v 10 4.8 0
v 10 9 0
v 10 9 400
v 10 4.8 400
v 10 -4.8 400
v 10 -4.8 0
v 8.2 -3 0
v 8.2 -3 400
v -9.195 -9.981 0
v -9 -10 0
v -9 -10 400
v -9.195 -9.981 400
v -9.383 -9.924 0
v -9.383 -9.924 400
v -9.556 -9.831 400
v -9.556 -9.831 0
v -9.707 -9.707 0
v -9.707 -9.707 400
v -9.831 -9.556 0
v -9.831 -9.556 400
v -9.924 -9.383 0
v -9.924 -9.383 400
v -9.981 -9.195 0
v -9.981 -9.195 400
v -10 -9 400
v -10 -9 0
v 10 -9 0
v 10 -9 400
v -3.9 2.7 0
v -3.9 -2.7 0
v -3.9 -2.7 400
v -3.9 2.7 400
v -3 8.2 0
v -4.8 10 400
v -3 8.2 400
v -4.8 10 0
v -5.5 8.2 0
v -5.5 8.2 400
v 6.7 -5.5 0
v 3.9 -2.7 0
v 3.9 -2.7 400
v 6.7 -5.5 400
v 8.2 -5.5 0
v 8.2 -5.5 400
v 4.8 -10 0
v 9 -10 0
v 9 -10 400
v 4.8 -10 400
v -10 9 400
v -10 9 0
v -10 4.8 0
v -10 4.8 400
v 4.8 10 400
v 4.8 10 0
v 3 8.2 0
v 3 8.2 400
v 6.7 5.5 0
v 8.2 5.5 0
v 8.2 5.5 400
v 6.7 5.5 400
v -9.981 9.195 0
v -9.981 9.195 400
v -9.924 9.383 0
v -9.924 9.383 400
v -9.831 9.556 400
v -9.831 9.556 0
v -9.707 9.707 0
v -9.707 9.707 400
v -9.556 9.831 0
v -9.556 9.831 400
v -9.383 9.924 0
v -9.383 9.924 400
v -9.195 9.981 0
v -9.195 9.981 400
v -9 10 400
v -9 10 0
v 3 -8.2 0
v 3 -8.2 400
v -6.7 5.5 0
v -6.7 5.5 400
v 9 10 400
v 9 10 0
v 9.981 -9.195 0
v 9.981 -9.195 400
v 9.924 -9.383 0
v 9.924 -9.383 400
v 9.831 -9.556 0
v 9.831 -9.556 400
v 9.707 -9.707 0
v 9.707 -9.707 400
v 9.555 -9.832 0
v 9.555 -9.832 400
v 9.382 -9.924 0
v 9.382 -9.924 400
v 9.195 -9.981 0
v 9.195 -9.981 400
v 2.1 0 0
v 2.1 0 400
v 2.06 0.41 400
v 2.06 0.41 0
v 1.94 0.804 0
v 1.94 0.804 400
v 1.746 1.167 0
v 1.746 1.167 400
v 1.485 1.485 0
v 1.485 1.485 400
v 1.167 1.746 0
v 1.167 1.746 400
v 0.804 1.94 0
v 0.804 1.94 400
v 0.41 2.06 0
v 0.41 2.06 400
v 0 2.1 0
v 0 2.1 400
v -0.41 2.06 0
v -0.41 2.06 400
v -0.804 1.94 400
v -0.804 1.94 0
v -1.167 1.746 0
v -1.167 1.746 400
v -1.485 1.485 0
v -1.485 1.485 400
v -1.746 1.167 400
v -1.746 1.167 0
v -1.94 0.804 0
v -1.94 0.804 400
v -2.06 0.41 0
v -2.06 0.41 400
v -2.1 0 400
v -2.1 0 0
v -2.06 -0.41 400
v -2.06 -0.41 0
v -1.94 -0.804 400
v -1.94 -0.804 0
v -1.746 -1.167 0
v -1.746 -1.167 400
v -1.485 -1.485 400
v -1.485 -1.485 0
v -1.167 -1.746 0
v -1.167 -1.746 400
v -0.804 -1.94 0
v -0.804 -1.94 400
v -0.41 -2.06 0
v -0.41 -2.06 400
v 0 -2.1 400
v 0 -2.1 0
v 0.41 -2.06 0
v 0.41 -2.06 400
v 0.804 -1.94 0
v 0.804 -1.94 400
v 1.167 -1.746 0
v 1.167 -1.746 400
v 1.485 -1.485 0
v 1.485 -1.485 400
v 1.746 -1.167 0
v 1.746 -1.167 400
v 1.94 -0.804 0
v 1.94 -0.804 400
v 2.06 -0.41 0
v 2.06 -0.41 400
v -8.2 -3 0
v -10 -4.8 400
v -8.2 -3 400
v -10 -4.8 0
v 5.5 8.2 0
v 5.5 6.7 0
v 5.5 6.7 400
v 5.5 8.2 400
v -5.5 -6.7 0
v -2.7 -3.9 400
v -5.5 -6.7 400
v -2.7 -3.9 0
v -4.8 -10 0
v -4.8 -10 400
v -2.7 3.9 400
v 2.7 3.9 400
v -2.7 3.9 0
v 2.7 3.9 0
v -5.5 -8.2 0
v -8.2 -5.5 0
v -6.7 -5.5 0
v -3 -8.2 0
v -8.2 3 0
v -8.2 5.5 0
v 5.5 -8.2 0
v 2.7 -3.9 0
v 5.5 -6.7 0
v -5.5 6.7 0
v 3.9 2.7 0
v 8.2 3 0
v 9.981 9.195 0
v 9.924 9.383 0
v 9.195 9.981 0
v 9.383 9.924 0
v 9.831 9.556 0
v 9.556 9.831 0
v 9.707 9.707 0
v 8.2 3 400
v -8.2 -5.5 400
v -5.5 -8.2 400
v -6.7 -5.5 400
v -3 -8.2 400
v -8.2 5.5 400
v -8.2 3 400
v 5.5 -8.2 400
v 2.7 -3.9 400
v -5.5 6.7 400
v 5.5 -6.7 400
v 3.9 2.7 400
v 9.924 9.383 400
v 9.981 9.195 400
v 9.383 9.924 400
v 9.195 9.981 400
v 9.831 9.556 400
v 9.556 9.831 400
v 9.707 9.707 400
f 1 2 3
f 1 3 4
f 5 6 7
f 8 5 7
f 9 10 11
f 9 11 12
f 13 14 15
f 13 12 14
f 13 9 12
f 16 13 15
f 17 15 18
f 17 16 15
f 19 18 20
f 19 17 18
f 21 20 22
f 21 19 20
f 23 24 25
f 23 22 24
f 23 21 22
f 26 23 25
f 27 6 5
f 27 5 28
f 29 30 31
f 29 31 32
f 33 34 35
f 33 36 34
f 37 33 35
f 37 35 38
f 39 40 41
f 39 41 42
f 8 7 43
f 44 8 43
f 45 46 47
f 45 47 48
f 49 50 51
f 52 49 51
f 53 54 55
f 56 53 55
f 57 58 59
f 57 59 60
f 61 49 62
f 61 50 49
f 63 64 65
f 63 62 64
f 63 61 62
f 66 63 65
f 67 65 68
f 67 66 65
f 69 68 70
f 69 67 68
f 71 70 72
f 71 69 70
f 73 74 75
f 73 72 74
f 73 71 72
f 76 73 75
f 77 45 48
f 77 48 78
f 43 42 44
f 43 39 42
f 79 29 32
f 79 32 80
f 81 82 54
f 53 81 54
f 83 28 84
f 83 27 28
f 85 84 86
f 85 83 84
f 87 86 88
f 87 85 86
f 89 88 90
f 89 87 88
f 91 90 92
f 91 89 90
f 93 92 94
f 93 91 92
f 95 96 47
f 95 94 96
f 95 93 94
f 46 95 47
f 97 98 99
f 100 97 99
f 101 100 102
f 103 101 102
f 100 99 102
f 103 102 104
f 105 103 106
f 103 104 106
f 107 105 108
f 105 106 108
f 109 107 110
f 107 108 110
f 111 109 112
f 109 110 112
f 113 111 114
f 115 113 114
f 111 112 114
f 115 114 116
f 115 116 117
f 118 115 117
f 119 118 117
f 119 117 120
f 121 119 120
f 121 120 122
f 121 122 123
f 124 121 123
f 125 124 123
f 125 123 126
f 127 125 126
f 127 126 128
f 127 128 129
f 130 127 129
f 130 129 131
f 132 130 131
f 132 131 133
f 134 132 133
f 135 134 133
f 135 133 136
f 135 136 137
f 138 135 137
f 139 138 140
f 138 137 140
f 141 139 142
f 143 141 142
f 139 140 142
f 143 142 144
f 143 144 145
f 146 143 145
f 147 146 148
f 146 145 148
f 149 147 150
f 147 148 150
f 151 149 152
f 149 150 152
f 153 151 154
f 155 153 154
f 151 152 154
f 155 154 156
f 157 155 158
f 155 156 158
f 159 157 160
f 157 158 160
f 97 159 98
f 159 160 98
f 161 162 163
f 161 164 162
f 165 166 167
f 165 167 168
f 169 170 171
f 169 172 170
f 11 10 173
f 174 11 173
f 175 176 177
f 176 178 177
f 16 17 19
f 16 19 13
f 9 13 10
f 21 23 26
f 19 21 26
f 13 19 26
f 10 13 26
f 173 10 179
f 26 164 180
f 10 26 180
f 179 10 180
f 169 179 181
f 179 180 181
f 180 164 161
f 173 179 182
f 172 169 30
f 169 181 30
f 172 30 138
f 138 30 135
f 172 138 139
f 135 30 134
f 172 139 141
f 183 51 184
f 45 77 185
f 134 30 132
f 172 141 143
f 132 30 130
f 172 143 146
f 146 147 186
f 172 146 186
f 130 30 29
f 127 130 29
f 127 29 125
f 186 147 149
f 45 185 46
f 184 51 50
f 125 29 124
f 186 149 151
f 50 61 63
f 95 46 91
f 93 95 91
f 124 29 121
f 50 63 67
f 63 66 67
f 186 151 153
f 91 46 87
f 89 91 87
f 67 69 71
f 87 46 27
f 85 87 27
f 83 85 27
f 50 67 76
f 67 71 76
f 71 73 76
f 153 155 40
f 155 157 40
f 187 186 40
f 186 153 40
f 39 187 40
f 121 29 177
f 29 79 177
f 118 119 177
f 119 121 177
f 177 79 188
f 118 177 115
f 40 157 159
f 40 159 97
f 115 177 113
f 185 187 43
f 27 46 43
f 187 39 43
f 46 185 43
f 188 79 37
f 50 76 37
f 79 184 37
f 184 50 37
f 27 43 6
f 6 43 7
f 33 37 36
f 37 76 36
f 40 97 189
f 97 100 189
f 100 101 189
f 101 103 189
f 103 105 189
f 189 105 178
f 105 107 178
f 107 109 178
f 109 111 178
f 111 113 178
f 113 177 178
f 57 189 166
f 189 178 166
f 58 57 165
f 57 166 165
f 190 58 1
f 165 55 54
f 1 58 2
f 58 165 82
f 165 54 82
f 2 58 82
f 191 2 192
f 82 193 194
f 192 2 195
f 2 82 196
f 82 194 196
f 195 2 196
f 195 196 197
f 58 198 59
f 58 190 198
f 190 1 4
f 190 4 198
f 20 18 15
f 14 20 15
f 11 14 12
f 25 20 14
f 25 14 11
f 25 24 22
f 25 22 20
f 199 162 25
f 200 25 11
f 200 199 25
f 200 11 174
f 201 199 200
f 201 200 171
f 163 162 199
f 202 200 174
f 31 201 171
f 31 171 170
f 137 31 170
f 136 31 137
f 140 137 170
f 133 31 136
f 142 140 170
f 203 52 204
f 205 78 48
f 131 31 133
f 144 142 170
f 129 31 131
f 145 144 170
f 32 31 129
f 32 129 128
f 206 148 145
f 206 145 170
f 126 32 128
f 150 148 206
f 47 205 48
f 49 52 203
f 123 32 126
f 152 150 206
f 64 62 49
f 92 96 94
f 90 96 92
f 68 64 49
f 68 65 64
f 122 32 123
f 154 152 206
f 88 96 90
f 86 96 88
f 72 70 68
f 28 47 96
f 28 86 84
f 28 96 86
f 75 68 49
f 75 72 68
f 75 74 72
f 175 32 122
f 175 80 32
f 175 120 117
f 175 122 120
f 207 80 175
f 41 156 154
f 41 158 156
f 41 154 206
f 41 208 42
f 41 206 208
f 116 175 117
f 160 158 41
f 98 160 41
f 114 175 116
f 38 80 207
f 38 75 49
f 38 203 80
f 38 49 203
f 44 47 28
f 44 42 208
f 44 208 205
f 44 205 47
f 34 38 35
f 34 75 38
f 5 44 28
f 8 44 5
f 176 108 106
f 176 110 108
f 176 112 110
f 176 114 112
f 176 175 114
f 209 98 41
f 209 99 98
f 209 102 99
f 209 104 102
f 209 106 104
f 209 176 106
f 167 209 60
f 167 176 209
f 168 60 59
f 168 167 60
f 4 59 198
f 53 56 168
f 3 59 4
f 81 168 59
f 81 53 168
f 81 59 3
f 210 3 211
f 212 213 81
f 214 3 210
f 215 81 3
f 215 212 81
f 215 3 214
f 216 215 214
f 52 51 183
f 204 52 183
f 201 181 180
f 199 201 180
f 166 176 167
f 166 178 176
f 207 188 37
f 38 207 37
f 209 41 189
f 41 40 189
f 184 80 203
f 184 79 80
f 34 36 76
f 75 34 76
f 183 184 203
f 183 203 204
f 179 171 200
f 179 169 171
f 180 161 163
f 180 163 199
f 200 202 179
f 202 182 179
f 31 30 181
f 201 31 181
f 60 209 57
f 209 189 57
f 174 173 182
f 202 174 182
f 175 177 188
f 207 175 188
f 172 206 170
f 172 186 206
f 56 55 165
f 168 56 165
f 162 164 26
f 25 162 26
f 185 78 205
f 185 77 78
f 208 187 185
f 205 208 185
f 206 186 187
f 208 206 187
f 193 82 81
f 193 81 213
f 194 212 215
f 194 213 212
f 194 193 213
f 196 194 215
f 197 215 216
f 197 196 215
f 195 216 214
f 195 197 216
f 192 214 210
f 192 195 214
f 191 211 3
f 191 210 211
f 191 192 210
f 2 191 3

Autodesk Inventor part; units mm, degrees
ref_plane "YZ Plane" through (0, 0, 0) normal (1, 0, 0) x (0, 1, 0)
ref_plane "XZ Plane" through (0, 0, 0) normal (0, 1, 0) x (-1, 0, 0)
ref_plane "XY Plane" through (0, 0, 0) normal (0, 0, 1) x (1, 0, 0)
sketch "Эскиз1" plane through (0, 0, 0) normal (0, 0, 1) x (1, 0, 0)
  line L0 (-4.8, 10) -> (-3, 8.2)
  line L1 (-4.8, 10) -> (-2.2544, 10) construction
  line L2 (4.8, 10) -> (3, 8.2)
  line L3 (4.8, 10) -> (7.3456, 10) construction
  line L4 (10, 4.8) -> (8.2, 3)
  arc A0 (-9, 10) -> (-10, 9) centre (-9, 9) ccw
  arc A1 (10, 9) -> (9, 10) centre (9, 9) ccw
  arc A2 (-10, -9) -> (-9, -10) centre (-9, -9) ccw
  arc A3 (8.9996, -10) -> (10, -9) centre (9, -9) ccw
  line L5 (0, 3.9) -> (-2.7, 3.9)
  line L6 (0, 3.9) -> (2.7, 3.9)
  line L7 (3, 8.2) -> (5.5, 8.2)
  line L8 (2.7, 3.9) -> (5.5, 6.7)
  line L9 (5.5, 6.7) -> (5.5, 8.2)
  line L10 (3.9, 0) -> (3.9, 2.7)
  line L11 (3.9, 0) -> (3.9, -2.7)
  line L12 (3.9, 2.7) -> (6.7, 5.5)
  line L13 (3.9, 2.7) -> (7.8598, 2.7) construction
  line L14 (9, 10) -> (4.8, 10)
  line L15 (-4.8, 10) -> (-9, 10)
  line L16 (0, -3.9) -> (-2.7, -3.9)
  line L17 (0, -3.9) -> (2.7, -3.9)
  line L18 (-3.9, 0) -> (-3.9, -2.7)
  line L19 (-3.9, 0) -> (-3.9, 2.7)
  line L20 (8.2, 3) -> (8.2, 5.5)
  line L21 (8.2, 5.5) -> (6.7, 5.5)
  line L22 (-10, -4.8) -> (-7.4544, -4.8) construction
  line L23 (-4.8, -10) -> (-3, -8.2)
  line L24 (-4.8, -10) -> (-2.2544, -10) construction
  line L25 (4.7996, -10) -> (2.9996, -8.2)
  line L26 (4.7996, -10) -> (7.3452, -10) construction
  line L27 (10, -4.8) -> (8.2, -3)
  line L28 (8.9996, -10) -> (4.7996, -10)
  line L29 (-9, -10) -> (-4.8, -10)
  line L30 (10, -4.8) -> (10, -9)
  line L31 (10, 9) -> (10, 4.8)
  line L32 (-10, -4.8) -> (-10, -9)
  line L33 (-3, 8.2) -> (-5.5, 8.2)
  line L34 (-2.7, 3.9) -> (-5.5, 6.7)
  line L35 (-2.7, 3.9) -> (1.2598, 3.9) construction
  line L36 (-5.5, 6.7) -> (-5.5, 8.2)
  line L37 (-3.9, 2.7) -> (-6.7, 5.5)
  line L38 (-6.7, 5.5) -> (-8.2, 5.5)
  line L39 (-8.2, -3) -> (-8.2, -5.5)
  line L40 (-3, -8.2) -> (-5.5, -8.2)
  line L41 (2.9996, -8.2) -> (5.5, -8.2)
  line L42 (8.2, -3) -> (8.2, -5.5)
  line L43 (-3.9, -2.7) -> (-6.7, -5.5)
  line L44 (-6.7, -5.5) -> (-8.2, -5.5)
  line L45 (-2.7, -3.9) -> (-5.5, -6.7)
  line L46 (-5.5, -6.7) -> (-5.5, -8.2)
  line L47 (-10, 9) -> (-10, 4.8)
  line L48 (-10, 4.8) -> (-8.2, 3)
  line L49 (-8.2, 5.5) -> (-8.2, 3)
  line L50 (-10, -4.8) -> (-8.2, -3)
  line L51 (2.7, -3.9) -> (5.5, -6.7)
  line L52 (5.5, -6.7) -> (5.5, -8.2)
  line L53 (3.9, -2.7) -> (6.7, -5.5)
  line L54 (6.7, -5.5) -> (8.2, -5.5)
  point P0 (0, 0)
  dimension "d16" = 45
  dimension "d17" = 135
  dimension "d25" = 6
  dimension "d29" = 1
  dimension "d30" = 1
  dimension "d31" = 2.7
  dimension "d32" = 2.7
  dimension "d34" = 2.5
  dimension "d36" = 2.7
  dimension "d37" = 2.7
  dimension "d38" = 3.9
  dimension "d39" = 45
  dimension "d42" = 2.7
  dimension "d43" = 2.7
  dimension "d44" = 3.9
  dimension "d45" = 2.7
  dimension "d46" = 2.7
  dimension "d48" = 10
  dimension "d49" = 10
  dimension "d55" = 4.5
  dimension "d58" = 9
  dimension "d59" = 9
  dimension "d60" = 2.5
  dimension "d61" = 2.8
  dimension "d63" = 1.6971
  dimension "d65" = 45
  dimension "d67" = 135
  dimension "d73" = 10
  dimension "d74" = 10
  dimension "d77" = 18
  dimension "d78" = 18
  dimension "d79" = 135
  dimension "d80" = 135
  dimension "d81" = 4.5
  dimension "d82" = 1.8
  dimension "d83" = 1.8
  dimension "d84" = 1
  dimension "d85" = 1
  dimension "d87" = 4.5
  dimension "d89" = 1.8
  dimension "d91" = 135
  dimension "d92" = 1.6971
  dimension "d94" = 4.5
  dimension "d95" = 1.8
  dimension "d96" = 4.5
  dimension "d97" = 1.8
  dimension "d98" = 4.5
  dimension "d99" = 1.8
  dimension "d100" = 1.8
  dimension "d107" = 4.2
  dimension "d108" = 10
  dimension "d109" = 4.5
  dimension "d110" = 1.8
  dimension "d111" = 135
  dimension "d112" = 4.2
  dimension "d113" = 4.2
  dimension "d114" = 6
  dimension "d115" = 135
  dimension "d116" = 1.6971
  dimension "d117" = 4.2
  dimension "d118" = 4.2
  dimension "d119" = 4.5
  dimension "d120" = 135
  dimension "d121" = 1.5
extrude "Выдавливание2" add sketch "Эскиз1" along normal blind 400
sketch "Эскиз2" plane through (0, 0, 400) normal (0, 0, 1) x (1, 0, 0)
  circle A0 centre (0, 0) radius 2.1
  dimension "d131" = 4.2
extrude "Выдавливание3" cut sketch "Эскиз2" against normal through all
properties part number "Профиль_аллюминиевый"
